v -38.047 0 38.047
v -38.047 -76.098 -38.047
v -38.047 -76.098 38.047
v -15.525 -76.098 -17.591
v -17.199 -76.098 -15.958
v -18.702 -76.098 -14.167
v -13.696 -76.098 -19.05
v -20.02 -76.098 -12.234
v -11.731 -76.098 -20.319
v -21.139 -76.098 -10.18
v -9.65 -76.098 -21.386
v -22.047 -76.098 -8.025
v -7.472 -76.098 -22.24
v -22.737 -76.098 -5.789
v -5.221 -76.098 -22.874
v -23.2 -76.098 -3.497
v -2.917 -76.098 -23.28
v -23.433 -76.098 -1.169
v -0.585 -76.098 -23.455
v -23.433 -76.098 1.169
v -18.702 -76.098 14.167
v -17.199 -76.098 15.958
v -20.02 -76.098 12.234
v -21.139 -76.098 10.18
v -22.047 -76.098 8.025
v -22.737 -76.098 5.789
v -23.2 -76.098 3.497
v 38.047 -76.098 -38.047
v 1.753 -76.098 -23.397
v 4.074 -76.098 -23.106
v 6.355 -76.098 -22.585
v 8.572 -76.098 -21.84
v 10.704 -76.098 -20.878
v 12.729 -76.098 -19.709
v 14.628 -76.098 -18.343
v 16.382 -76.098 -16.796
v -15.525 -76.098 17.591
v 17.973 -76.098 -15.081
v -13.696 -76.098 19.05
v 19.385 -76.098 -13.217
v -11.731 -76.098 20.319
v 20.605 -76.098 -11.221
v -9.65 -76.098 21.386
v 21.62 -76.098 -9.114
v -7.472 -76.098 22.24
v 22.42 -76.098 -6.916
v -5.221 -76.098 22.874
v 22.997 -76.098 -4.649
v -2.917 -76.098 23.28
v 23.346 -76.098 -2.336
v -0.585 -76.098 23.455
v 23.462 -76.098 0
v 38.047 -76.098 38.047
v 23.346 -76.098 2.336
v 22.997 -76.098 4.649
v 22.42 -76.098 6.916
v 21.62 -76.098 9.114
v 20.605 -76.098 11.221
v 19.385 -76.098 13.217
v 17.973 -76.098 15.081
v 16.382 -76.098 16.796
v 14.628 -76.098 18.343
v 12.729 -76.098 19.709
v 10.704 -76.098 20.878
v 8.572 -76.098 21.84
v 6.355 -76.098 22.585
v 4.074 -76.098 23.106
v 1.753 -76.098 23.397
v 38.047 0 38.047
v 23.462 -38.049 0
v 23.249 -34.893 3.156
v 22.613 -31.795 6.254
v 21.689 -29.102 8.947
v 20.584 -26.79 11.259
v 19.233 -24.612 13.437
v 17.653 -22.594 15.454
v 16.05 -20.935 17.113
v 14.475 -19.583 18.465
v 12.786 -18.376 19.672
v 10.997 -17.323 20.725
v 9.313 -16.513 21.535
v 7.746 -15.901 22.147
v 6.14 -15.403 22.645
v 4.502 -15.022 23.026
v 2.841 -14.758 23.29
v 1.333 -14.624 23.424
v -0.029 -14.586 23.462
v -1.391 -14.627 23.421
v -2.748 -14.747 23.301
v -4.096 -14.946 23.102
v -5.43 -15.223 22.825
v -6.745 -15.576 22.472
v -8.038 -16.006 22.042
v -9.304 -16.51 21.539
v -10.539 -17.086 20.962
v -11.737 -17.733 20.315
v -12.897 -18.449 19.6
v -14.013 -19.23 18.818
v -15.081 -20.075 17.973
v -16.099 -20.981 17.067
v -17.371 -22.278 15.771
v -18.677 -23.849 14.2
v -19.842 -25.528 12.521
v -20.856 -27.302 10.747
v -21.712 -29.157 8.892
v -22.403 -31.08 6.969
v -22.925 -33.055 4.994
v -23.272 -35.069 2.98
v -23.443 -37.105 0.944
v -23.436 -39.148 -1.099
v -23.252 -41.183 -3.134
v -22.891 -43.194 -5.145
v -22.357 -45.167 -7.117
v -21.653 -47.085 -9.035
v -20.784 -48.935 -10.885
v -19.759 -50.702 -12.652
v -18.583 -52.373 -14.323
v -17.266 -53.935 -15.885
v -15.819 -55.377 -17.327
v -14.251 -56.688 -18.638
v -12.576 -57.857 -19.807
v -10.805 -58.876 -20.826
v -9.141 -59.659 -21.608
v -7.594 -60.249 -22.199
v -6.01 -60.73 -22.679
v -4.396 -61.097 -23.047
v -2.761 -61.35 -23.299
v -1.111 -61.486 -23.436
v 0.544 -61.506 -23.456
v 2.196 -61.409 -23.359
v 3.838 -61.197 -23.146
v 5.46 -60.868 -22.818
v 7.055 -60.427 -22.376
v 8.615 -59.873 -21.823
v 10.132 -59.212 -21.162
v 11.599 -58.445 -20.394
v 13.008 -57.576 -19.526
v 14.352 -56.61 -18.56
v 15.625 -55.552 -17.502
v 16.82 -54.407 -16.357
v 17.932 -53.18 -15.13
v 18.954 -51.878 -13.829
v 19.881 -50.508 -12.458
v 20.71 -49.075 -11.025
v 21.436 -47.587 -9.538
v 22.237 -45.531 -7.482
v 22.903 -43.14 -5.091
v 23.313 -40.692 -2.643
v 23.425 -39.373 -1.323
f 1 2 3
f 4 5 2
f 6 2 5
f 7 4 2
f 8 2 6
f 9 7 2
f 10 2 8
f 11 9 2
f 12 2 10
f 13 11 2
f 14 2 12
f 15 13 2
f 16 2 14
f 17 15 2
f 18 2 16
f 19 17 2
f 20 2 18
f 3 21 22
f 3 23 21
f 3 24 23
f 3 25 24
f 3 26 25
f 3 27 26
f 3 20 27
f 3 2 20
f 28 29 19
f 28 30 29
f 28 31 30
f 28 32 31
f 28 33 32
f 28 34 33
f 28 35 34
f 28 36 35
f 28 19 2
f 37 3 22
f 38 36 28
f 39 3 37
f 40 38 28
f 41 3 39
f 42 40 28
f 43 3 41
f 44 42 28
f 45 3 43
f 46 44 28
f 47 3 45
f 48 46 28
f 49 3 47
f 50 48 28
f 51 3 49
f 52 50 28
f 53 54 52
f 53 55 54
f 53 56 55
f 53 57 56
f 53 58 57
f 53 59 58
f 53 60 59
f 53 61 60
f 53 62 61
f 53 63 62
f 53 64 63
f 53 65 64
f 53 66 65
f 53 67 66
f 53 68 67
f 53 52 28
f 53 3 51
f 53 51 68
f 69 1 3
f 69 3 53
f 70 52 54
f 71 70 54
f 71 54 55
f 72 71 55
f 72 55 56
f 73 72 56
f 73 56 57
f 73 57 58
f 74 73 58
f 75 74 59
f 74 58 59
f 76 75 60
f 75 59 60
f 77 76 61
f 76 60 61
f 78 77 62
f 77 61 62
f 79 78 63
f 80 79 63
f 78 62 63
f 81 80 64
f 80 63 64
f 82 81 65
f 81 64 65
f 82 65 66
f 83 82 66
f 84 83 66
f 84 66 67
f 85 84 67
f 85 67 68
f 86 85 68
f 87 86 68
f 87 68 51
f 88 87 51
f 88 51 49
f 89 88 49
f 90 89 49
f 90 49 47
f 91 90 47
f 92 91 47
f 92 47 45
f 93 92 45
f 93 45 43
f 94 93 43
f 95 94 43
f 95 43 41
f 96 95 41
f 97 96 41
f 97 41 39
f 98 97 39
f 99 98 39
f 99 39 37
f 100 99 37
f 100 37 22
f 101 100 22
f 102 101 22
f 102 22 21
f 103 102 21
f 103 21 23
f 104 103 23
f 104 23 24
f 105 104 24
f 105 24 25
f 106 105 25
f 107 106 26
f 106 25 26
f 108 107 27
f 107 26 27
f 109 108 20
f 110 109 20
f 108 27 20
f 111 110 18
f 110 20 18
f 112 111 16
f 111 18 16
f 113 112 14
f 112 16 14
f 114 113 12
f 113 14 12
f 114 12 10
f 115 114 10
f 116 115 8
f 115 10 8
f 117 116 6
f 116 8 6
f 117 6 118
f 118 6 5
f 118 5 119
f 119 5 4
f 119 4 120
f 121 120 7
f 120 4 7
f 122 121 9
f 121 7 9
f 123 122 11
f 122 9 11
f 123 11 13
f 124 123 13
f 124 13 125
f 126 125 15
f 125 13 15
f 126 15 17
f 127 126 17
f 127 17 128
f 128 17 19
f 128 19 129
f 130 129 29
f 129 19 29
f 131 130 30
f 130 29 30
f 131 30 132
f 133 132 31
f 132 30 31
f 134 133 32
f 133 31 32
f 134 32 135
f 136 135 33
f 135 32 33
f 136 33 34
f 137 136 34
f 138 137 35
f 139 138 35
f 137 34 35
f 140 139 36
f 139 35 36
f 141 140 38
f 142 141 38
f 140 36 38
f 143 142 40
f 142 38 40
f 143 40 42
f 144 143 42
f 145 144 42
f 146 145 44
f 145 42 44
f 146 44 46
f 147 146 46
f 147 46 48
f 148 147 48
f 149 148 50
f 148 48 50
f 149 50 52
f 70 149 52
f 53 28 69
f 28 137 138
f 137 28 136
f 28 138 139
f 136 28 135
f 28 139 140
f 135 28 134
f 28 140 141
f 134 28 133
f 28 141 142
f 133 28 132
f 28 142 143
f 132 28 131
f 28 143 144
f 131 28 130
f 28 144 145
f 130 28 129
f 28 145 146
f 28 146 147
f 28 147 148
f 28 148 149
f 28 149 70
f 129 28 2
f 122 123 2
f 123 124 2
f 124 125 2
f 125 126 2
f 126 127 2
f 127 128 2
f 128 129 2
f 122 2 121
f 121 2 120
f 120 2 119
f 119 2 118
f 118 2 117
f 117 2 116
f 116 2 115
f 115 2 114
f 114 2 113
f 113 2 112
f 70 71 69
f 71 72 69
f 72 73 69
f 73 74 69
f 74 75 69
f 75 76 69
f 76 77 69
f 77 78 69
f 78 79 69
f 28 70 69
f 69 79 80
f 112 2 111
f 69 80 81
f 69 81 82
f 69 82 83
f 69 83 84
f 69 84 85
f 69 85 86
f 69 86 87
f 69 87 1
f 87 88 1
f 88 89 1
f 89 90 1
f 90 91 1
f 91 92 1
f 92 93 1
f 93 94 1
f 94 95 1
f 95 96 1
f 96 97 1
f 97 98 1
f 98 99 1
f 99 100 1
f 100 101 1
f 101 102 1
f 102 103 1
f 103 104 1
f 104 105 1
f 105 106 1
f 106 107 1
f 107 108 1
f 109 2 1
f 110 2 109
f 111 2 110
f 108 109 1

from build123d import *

# Parameters (mm, degrees)
F0_W     = 76.094658
F0_H     = 76.094658
F1_DEPTH = 76.0984
F3_DEPTH = 76.0984
F4_R     = 23.46217
F5_DEPTH = 63.5


with BuildPart() as f1:
    # F0 (on Front) → F1 (new body)
    with BuildSketch(Plane.XZ):
        Rectangle(F0_W, F0_H)
    extrude(amount=F1_DEPTH)

    # F2 (on face) → F3 (cut)
    with BuildSketch(Plane(origin=(-38.047329, 0, 0), x_dir=(0, -1, 0), z_dir=(-1, 0, 0))):
        Polygon((76.0984, -38.047329), (0, 38.047329), (0, -38.047329), align=None)
    extrude(amount=-F3_DEPTH, mode=Mode.SUBTRACT)

    # F4 (on face) → F5 (cut)
    with BuildSketch(Plane.XZ.offset(76.0984)):
        Circle(F4_R)
    extrude(amount=-F5_DEPTH, mode=Mode.SUBTRACT)


solid = f1.part
